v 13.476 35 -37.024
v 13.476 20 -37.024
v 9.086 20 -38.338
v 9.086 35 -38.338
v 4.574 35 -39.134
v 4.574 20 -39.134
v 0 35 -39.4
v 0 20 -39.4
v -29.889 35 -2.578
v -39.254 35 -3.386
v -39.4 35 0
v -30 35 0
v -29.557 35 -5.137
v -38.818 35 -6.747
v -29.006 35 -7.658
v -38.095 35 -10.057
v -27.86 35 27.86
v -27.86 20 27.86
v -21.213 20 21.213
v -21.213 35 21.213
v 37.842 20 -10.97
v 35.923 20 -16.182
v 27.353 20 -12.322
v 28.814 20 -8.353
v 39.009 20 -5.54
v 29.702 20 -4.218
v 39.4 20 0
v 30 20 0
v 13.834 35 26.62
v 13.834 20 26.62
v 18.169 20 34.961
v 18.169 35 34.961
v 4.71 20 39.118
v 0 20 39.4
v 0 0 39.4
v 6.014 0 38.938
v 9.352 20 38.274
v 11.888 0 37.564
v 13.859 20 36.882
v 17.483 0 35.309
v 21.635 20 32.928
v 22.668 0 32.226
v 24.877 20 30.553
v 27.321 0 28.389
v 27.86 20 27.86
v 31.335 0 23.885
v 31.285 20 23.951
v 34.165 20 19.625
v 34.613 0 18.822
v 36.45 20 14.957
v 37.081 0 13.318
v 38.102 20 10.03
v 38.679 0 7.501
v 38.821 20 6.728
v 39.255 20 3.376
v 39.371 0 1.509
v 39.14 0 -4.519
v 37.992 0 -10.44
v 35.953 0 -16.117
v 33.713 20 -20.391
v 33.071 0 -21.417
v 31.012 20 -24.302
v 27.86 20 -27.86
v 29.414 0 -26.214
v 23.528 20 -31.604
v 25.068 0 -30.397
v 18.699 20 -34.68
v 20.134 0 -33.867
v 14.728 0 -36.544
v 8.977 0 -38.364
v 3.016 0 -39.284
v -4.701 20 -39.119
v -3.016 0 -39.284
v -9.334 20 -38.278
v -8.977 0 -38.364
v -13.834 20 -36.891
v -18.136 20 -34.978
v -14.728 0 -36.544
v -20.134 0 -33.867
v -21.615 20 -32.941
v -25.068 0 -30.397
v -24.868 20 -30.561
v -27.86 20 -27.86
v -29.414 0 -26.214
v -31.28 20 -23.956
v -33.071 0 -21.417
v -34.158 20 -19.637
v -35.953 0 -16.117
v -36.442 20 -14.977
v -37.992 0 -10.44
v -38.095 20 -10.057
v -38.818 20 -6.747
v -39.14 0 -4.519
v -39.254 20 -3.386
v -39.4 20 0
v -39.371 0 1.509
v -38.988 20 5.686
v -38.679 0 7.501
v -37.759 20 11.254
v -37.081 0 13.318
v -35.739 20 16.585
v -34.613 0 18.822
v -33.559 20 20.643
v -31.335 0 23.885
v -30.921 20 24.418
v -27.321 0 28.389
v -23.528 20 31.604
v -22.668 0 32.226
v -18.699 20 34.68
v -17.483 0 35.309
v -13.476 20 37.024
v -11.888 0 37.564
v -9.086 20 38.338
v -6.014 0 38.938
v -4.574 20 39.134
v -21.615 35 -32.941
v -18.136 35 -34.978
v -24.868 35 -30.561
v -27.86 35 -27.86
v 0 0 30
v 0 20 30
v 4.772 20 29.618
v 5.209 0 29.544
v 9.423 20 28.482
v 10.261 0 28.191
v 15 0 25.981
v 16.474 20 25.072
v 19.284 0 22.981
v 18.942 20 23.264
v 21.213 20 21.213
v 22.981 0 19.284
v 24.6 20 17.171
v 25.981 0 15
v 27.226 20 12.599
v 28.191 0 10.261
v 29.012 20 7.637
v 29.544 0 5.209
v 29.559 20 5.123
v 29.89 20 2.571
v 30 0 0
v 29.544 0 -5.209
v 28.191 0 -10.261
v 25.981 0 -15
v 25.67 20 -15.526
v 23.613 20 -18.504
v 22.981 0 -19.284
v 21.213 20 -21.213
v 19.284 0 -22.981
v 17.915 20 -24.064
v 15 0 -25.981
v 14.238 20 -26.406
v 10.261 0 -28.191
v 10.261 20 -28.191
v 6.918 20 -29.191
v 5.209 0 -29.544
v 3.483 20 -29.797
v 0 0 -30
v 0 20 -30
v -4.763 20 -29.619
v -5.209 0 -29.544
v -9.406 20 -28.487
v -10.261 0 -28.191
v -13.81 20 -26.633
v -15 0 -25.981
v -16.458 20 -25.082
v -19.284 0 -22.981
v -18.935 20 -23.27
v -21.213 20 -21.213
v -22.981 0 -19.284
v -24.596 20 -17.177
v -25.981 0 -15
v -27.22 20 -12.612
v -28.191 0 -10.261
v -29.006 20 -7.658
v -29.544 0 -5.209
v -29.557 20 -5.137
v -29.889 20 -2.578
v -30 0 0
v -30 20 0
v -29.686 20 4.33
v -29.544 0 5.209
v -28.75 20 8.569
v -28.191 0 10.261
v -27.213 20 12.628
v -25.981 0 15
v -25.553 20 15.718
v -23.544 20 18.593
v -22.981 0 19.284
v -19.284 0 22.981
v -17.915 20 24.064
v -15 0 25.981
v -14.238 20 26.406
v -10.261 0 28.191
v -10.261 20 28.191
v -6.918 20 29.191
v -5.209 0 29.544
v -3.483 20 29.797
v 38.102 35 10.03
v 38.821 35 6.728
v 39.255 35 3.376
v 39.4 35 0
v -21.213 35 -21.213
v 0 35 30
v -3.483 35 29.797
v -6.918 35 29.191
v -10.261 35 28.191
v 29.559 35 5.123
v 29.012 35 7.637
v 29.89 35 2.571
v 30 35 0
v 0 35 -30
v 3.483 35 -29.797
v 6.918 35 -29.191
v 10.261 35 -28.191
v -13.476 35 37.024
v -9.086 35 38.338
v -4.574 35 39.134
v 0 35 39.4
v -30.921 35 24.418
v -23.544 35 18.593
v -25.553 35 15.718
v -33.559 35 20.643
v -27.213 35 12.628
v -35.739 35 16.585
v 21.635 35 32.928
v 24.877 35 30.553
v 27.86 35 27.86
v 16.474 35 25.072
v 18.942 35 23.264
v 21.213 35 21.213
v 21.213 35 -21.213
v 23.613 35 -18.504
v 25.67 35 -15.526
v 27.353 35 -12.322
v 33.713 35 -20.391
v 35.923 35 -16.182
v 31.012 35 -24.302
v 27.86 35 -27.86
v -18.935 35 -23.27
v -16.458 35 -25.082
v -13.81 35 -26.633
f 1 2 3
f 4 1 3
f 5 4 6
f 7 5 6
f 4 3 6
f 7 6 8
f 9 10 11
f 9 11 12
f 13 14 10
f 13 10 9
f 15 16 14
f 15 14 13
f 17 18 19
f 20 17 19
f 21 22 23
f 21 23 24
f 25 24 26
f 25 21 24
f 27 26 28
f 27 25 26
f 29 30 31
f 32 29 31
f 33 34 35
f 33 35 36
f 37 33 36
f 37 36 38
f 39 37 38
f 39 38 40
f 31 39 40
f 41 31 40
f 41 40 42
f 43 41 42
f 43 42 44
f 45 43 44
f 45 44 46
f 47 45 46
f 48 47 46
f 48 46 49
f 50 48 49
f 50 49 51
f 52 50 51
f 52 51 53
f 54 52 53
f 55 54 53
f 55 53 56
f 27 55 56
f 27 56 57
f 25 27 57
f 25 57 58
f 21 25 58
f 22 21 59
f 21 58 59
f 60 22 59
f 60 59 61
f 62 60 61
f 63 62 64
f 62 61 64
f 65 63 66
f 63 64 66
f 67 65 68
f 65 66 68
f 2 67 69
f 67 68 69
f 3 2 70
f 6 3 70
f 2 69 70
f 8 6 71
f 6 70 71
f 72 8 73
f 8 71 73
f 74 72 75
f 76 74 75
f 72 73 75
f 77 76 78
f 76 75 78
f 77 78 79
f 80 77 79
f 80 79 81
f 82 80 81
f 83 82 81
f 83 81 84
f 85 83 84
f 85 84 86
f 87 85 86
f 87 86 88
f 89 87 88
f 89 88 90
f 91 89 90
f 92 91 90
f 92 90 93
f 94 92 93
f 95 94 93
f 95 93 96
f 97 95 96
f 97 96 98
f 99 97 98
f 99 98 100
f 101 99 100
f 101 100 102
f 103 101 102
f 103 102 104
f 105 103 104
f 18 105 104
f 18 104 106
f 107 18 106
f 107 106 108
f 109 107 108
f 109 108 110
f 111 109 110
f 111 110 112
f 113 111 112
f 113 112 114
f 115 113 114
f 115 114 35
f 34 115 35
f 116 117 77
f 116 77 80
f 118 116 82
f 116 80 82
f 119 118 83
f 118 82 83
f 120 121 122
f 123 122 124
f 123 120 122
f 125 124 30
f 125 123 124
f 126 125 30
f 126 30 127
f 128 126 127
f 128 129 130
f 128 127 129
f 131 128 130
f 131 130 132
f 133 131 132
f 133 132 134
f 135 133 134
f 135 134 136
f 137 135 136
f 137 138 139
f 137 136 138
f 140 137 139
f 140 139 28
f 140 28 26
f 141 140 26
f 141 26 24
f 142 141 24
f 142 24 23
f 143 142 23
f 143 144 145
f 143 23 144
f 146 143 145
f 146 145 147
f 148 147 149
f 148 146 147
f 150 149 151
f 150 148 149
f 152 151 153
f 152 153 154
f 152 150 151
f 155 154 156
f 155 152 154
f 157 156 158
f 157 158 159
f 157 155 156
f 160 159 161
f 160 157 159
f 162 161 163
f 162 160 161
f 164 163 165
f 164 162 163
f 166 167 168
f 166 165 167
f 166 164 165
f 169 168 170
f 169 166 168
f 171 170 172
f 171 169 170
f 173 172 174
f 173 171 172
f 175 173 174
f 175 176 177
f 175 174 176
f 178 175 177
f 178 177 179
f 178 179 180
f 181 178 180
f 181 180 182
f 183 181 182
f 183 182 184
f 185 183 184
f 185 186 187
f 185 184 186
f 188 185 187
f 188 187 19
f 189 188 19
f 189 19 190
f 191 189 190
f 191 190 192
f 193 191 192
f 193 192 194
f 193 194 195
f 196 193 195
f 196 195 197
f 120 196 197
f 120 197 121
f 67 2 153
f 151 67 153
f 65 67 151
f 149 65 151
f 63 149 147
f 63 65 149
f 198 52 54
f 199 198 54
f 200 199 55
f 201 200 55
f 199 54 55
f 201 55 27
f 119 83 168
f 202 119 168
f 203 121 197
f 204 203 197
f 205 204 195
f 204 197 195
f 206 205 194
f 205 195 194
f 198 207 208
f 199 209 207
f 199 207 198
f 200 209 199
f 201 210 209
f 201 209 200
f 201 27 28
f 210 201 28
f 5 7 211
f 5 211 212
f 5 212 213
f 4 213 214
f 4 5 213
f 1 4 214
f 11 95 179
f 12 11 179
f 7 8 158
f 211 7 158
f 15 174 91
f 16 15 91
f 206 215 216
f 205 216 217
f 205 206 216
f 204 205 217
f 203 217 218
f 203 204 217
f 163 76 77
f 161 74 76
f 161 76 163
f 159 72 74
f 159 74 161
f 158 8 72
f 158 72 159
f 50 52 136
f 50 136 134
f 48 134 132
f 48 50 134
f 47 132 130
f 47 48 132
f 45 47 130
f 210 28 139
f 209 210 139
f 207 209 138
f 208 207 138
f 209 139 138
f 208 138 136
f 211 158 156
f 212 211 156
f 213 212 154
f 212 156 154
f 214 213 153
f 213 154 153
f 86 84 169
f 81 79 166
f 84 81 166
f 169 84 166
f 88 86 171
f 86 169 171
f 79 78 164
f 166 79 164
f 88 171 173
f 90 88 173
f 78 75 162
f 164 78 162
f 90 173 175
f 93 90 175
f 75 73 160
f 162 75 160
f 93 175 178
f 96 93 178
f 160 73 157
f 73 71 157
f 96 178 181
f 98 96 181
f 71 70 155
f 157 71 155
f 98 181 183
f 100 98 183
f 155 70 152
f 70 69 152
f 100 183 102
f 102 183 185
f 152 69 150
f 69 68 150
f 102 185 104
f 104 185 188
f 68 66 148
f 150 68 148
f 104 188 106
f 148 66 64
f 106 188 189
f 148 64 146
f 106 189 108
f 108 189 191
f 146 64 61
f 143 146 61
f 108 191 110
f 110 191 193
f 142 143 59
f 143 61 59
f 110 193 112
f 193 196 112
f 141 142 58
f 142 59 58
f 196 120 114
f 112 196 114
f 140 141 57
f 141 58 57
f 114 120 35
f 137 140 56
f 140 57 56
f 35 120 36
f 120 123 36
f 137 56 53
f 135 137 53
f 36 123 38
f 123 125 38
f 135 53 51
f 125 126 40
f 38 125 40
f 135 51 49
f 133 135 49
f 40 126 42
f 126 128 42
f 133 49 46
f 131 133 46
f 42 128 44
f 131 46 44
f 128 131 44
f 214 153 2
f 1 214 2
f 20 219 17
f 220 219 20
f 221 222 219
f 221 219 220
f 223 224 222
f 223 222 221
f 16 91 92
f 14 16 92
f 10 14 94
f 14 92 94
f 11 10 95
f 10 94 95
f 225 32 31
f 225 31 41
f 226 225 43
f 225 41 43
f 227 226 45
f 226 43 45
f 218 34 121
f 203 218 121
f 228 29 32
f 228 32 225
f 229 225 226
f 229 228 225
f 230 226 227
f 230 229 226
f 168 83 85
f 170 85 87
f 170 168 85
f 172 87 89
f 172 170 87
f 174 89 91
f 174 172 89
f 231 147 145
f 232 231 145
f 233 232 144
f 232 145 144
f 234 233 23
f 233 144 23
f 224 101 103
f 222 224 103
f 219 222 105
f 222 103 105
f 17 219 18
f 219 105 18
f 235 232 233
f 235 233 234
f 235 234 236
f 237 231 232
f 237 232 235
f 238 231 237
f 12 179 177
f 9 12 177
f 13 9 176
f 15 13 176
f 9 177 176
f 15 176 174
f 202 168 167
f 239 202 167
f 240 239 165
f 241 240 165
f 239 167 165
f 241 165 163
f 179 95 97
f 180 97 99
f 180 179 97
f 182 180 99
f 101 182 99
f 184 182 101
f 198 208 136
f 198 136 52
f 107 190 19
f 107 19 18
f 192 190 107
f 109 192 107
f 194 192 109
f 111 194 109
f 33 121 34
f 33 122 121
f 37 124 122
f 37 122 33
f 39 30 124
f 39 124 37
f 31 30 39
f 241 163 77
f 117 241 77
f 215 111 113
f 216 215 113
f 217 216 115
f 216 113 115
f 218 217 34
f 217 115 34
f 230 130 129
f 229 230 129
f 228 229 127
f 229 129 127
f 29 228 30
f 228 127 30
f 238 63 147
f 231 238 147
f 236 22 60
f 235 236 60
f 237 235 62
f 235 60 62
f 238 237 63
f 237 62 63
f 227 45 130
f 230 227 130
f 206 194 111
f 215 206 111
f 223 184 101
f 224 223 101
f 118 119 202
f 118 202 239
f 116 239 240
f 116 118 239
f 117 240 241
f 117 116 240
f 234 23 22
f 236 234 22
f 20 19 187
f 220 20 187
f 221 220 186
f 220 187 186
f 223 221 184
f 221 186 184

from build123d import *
from build123d.topology import SkipClean

# Parameters (mm, degrees)
SKETCH1_R           = 39.4
SKETCH1_R_2         = 30
BOSS_EXTRUDE1_DEPTH = 20
BOSS_EXTRUDE2_DEPTH = 15


with BuildPart() as part:
    # Sketch1 → Boss-Extrude1 (new body)
    with BuildSketch(Plane(origin=(0, 0, 0), x_dir=(1, 0, 0), z_dir=(0, 1, 0))):
        with Locations(Location((0, 0, 0), (0, 0, 270))):
            Circle(SKETCH1_R)
        with Locations(Location((0, 0, 0), (0, 0, 270))):
            Circle(SKETCH1_R_2, mode=Mode.SUBTRACT)
    extrude(amount=BOSS_EXTRUDE1_DEPTH)

    # Sketch2 → Boss-Extrude2 (add)
    with SkipClean():  # the faces are left unmerged after this step: merging them gives an invalid solid
        with BuildSketch(Plane(origin=(0, 20, 0), x_dir=(1, 0, 0), z_dir=(0, 1, 0))):
            with BuildLine():
                Line((-29.006131017, 7.657960788), (-38.094718735, 10.057455169))
                ThreePointArc((-38.094718735, 10.057455169), (-39.072317043, 5.070901391), (-39.4, 0))
                Line((-39.4, 0), (-30, 0))
                ThreePointArc((-30, 0), (-29.75049521, 3.861092429), (-29.006131017, 7.657960788))
            make_face()
            with BuildLine():
                Line((-27.21258864, -12.628341916), (-35.739199747, -16.585222382))
                ThreePointArc((-35.739199747, -16.585222382), (-32.295432702, -22.569116655), (-27.860007179, -27.860007179))
                Line((-27.860007179, -27.860007179), (-21.213203436, -21.213203436))
                ThreePointArc((-21.213203436, -21.213203436), (-24.590430992, -17.18460659), (-27.21258864, -12.628341916))
            make_face()
            with BuildLine():
                Line((-10.2606043, -28.190778624), (-13.475593647, -37.023889259))
                ThreePointArc((-13.475593647, -37.023889259), (-6.8417382, -38.801425469), (0, -39.4))
                Line((0, -39.4), (0, -30))
                ThreePointArc((0, -30), (-5.20944533, -29.54423259), (-10.2606043, -28.190778624))
            make_face()
            with BuildLine():
                Line((13.833981995, -26.619935052), (18.168629687, -34.960848034))
                ThreePointArc((18.168629687, -34.960848034), (23.286569909, -31.782002169), (27.860007179, -27.860007179))
                Line((27.860007179, -27.860007179), (21.213203436, -21.213203436))
                ThreePointArc((21.213203436, -21.213203436), (17.730890794, -24.199494037), (13.833981995, -26.619935052))
            make_face()
            with BuildLine():
                Line((39.4, 0), (30, 0))
                ThreePointArc((30, 0), (29.751894914, -3.850292074), (29.011683396, -7.636899012))
                Line((29.011683396, -7.636899012), (38.10201086, -10.029794035))
                ThreePointArc((38.10201086, -10.029794035), (39.07415532, -5.056716924), (39.4, 0))
            make_face()
            with BuildLine():
                Line((27.860007179, 27.860007179), (21.213203436, 21.213203436))
                ThreePointArc((21.213203436, 21.213203436), (24.686675185, 17.046057265), (27.352889551, 12.321502878))
                Line((27.352889551, 12.321502878), (35.923461611, 16.182240447))
                ThreePointArc((35.923461611, 16.182240447), (32.42183341, 22.387155208), (27.860007179, 27.860007179))
            make_face()
            with BuildLine():
                ThreePointArc((13.475593647, 37.023889259), (6.8417382, 38.801425469), (0, 39.4))
                Line((0, 39.4), (0, 30))
                ThreePointArc((0, 30), (5.20944533, 29.54423259), (10.2606043, 28.190778624))
                Line((10.2606043, 28.190778624), (13.475593647, 37.023889259))
            make_face()
            with BuildLine():
                ThreePointArc((-18.13649628, 34.977528539), (-23.271965112, 31.792697901), (-27.860007179, 27.860007179))
                Line((-27.860007179, 27.860007179), (-21.213203436, 21.213203436))
                ThreePointArc((-21.213203436, 21.213203436), (-17.71977039, 24.207637996), (-13.809514934, 26.632635943))
                Line((-13.809514934, 26.632635943), (-18.13649628, 34.977528539))
            make_face()
        extrude(amount=BOSS_EXTRUDE2_DEPTH)


solid = part.part
